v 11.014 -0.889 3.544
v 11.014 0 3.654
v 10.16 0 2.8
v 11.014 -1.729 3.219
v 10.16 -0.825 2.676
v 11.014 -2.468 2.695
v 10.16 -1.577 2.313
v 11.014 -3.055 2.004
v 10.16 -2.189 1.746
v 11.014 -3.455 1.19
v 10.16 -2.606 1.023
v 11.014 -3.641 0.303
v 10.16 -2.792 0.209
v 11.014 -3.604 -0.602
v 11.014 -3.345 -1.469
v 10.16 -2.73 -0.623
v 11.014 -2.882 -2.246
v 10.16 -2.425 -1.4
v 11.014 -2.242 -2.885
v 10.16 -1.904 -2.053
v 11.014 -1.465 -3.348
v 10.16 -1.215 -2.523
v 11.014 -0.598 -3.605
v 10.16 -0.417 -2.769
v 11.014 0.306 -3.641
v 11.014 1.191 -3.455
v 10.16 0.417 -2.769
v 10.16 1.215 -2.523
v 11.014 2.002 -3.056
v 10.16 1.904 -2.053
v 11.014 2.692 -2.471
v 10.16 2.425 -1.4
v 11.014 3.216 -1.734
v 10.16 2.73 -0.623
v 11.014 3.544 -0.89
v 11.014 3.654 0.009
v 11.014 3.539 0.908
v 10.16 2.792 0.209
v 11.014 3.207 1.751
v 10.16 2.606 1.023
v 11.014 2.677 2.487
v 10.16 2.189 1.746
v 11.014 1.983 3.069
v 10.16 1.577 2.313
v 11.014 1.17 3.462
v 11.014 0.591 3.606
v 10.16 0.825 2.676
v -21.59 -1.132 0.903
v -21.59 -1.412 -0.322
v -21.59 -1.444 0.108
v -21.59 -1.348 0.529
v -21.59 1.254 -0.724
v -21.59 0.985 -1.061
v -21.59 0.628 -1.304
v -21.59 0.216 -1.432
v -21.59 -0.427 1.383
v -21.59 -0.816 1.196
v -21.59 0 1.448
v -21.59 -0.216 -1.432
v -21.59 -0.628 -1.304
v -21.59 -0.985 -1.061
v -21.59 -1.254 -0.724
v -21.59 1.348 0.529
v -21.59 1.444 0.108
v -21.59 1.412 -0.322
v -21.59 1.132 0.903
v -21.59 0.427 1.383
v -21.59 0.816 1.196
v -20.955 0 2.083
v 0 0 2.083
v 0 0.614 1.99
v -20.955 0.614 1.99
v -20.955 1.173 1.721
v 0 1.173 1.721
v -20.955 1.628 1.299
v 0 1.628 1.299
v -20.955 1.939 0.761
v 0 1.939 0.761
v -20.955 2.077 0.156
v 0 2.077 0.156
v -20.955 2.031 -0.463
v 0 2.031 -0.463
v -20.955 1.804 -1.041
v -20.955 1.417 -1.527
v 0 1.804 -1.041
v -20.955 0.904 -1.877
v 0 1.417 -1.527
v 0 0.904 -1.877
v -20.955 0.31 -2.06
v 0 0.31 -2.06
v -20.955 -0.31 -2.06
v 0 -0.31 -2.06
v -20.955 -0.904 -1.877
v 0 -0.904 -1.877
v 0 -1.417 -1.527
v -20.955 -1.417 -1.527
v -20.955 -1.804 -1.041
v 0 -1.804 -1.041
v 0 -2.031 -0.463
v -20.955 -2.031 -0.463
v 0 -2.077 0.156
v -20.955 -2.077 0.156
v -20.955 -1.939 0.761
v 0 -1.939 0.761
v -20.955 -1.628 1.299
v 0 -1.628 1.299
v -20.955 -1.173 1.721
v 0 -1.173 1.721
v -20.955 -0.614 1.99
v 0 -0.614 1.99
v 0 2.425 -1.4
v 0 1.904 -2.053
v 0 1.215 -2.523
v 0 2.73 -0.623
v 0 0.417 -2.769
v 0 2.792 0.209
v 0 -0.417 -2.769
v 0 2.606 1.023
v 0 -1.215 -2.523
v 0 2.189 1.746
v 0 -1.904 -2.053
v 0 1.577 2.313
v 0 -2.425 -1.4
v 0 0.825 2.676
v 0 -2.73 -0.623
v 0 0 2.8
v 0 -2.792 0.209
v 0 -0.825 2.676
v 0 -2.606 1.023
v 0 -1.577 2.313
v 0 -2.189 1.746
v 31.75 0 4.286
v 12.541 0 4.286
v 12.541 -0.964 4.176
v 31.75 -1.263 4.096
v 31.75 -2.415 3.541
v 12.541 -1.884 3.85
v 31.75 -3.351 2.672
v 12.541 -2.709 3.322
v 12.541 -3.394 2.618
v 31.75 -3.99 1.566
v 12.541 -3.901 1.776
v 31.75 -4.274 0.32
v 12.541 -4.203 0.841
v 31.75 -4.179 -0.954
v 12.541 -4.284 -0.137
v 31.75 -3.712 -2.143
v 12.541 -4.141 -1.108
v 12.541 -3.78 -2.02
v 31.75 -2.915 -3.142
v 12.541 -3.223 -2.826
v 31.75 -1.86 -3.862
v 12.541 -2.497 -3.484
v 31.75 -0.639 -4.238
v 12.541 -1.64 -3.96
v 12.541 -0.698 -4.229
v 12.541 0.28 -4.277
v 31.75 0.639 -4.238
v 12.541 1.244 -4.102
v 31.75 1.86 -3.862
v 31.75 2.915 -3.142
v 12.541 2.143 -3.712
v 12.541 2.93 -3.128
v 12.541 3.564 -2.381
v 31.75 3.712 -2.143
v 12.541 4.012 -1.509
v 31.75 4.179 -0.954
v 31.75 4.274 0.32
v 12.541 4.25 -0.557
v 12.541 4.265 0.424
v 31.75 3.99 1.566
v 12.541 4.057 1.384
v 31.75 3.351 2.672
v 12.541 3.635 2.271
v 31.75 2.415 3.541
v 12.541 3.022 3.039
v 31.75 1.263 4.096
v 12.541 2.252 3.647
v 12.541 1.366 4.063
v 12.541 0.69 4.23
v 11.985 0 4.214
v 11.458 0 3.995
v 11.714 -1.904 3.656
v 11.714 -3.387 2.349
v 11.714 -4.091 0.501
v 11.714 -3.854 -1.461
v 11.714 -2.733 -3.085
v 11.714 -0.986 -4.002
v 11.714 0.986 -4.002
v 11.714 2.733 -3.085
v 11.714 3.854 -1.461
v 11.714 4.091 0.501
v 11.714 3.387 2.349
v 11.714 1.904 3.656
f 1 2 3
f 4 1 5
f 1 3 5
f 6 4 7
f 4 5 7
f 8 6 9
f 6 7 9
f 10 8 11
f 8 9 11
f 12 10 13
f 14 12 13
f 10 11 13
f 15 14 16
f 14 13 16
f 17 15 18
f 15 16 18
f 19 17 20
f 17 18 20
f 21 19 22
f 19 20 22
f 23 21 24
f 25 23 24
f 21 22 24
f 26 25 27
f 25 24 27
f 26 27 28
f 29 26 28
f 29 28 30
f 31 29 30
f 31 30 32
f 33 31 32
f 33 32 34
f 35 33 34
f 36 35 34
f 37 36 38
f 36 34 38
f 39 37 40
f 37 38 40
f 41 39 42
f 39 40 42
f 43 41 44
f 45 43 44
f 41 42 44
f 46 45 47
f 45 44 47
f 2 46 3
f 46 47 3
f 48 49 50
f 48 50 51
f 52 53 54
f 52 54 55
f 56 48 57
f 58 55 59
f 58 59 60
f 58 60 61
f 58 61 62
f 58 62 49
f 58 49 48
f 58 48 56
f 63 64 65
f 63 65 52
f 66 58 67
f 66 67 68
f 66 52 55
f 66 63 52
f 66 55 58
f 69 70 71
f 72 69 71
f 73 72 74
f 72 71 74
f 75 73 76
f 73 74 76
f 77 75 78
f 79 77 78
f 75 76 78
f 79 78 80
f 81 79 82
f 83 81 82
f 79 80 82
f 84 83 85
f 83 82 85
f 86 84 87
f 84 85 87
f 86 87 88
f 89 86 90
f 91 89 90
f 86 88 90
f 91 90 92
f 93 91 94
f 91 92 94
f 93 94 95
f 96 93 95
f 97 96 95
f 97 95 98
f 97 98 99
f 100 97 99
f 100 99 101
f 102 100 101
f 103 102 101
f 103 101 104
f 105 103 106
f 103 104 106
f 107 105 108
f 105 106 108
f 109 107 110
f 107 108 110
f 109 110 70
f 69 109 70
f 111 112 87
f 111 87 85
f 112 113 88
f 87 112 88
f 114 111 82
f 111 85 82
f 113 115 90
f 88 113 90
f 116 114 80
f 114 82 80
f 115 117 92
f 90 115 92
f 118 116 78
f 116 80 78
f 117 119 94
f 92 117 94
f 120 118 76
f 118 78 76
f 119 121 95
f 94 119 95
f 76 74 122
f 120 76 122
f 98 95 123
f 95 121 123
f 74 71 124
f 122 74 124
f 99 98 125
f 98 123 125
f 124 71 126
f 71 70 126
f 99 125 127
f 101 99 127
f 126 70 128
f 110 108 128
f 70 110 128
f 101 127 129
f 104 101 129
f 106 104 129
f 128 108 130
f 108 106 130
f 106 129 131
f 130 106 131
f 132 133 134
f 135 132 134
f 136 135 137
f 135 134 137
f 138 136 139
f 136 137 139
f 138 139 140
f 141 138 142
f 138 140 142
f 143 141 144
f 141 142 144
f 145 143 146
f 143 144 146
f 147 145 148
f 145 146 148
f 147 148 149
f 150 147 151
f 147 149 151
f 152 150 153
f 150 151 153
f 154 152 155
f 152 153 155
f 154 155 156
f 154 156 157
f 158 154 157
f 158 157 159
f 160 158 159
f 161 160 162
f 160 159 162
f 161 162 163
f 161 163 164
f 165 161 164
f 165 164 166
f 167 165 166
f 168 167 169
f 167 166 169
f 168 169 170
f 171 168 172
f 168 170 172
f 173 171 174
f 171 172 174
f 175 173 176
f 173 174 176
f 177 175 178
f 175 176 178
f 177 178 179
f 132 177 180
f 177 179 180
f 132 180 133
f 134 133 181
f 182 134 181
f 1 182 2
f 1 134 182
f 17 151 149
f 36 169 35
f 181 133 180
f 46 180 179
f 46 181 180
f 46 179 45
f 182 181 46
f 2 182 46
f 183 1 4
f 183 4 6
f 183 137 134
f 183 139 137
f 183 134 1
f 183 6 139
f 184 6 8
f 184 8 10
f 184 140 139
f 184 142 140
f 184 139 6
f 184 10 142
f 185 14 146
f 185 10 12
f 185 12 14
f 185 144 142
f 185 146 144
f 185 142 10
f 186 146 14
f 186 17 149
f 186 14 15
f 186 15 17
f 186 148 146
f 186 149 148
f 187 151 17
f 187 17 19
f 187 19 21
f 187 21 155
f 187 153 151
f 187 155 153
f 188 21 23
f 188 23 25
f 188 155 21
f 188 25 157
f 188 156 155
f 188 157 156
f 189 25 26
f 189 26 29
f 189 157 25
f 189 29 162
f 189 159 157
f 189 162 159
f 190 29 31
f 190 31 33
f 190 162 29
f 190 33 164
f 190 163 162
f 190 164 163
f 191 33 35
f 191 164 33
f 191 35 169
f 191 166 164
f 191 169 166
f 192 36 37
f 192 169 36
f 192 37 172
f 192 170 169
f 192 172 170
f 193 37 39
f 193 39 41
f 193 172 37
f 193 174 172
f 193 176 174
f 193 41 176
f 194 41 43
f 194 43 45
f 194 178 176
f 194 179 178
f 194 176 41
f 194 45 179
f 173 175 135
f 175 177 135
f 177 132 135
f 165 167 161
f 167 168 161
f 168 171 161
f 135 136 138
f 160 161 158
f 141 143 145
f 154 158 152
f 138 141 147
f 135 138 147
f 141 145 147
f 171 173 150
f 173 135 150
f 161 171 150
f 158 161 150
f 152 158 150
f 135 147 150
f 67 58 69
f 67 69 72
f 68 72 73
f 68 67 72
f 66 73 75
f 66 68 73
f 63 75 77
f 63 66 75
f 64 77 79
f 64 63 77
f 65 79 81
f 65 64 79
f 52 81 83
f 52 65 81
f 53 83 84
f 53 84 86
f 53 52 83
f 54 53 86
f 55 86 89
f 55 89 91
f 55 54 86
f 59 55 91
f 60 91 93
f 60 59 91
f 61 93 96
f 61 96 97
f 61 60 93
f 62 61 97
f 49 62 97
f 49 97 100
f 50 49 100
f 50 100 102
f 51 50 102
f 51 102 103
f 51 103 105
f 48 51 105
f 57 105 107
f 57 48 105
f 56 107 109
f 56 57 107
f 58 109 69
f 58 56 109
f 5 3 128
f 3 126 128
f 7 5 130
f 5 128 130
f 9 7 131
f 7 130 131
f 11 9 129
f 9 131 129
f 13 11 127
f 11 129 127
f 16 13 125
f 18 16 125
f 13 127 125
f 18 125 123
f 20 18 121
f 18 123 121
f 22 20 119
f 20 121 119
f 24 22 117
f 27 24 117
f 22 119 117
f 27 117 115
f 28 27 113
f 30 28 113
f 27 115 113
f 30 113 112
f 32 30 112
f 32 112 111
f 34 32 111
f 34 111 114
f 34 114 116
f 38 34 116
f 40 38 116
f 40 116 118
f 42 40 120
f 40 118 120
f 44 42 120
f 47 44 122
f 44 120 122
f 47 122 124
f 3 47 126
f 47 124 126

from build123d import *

# Parameters (mm, degrees)
FILLET1_R           = 2.159
SKETCH6_R           = 2.0828
BOSS_EXTRUDE1_DEPTH = 21.59
CHAMFER2_SIZE       = 0.635


with BuildPart() as part:
    # Sketch1 → Revolve1 (revolve)
    with BuildSketch(Plane.XY, mode=Mode.PRIVATE) as revolve1_sk:
        Polygon((31.75, 0), (31.75, 4.28625), (11.64625, 4.28625), (10.16, 2.8), (0, 2.8), (0, 0), align=None)
    revolve(revolve1_sk.sketch.rotate(Axis((0, 0, 0), (1, 0, 0)), 90), axis=Axis((0, 0, 0), (1, 0, 0)))

    # Fillet1
    fillet1_edges = [part.edges().sort_by_distance(p)[0] for p in [
        (11.64625, 0, -4.28625),
    ]]
    fillet(fillet1_edges, radius=FILLET1_R)

    # Sketch6 → Boss-Extrude1 (add)
    with BuildSketch(Plane.ZY):
        Circle(SKETCH6_R)
    extrude(amount=BOSS_EXTRUDE1_DEPTH)

    # Chamfer2
    chamfer2_edges = [part.edges().sort_by_distance(p)[0] for p in [
        (-21.59, 0, -2.0828),
    ]]
    chamfer(chamfer2_edges, length=CHAMFER2_SIZE)


solid = part.part
